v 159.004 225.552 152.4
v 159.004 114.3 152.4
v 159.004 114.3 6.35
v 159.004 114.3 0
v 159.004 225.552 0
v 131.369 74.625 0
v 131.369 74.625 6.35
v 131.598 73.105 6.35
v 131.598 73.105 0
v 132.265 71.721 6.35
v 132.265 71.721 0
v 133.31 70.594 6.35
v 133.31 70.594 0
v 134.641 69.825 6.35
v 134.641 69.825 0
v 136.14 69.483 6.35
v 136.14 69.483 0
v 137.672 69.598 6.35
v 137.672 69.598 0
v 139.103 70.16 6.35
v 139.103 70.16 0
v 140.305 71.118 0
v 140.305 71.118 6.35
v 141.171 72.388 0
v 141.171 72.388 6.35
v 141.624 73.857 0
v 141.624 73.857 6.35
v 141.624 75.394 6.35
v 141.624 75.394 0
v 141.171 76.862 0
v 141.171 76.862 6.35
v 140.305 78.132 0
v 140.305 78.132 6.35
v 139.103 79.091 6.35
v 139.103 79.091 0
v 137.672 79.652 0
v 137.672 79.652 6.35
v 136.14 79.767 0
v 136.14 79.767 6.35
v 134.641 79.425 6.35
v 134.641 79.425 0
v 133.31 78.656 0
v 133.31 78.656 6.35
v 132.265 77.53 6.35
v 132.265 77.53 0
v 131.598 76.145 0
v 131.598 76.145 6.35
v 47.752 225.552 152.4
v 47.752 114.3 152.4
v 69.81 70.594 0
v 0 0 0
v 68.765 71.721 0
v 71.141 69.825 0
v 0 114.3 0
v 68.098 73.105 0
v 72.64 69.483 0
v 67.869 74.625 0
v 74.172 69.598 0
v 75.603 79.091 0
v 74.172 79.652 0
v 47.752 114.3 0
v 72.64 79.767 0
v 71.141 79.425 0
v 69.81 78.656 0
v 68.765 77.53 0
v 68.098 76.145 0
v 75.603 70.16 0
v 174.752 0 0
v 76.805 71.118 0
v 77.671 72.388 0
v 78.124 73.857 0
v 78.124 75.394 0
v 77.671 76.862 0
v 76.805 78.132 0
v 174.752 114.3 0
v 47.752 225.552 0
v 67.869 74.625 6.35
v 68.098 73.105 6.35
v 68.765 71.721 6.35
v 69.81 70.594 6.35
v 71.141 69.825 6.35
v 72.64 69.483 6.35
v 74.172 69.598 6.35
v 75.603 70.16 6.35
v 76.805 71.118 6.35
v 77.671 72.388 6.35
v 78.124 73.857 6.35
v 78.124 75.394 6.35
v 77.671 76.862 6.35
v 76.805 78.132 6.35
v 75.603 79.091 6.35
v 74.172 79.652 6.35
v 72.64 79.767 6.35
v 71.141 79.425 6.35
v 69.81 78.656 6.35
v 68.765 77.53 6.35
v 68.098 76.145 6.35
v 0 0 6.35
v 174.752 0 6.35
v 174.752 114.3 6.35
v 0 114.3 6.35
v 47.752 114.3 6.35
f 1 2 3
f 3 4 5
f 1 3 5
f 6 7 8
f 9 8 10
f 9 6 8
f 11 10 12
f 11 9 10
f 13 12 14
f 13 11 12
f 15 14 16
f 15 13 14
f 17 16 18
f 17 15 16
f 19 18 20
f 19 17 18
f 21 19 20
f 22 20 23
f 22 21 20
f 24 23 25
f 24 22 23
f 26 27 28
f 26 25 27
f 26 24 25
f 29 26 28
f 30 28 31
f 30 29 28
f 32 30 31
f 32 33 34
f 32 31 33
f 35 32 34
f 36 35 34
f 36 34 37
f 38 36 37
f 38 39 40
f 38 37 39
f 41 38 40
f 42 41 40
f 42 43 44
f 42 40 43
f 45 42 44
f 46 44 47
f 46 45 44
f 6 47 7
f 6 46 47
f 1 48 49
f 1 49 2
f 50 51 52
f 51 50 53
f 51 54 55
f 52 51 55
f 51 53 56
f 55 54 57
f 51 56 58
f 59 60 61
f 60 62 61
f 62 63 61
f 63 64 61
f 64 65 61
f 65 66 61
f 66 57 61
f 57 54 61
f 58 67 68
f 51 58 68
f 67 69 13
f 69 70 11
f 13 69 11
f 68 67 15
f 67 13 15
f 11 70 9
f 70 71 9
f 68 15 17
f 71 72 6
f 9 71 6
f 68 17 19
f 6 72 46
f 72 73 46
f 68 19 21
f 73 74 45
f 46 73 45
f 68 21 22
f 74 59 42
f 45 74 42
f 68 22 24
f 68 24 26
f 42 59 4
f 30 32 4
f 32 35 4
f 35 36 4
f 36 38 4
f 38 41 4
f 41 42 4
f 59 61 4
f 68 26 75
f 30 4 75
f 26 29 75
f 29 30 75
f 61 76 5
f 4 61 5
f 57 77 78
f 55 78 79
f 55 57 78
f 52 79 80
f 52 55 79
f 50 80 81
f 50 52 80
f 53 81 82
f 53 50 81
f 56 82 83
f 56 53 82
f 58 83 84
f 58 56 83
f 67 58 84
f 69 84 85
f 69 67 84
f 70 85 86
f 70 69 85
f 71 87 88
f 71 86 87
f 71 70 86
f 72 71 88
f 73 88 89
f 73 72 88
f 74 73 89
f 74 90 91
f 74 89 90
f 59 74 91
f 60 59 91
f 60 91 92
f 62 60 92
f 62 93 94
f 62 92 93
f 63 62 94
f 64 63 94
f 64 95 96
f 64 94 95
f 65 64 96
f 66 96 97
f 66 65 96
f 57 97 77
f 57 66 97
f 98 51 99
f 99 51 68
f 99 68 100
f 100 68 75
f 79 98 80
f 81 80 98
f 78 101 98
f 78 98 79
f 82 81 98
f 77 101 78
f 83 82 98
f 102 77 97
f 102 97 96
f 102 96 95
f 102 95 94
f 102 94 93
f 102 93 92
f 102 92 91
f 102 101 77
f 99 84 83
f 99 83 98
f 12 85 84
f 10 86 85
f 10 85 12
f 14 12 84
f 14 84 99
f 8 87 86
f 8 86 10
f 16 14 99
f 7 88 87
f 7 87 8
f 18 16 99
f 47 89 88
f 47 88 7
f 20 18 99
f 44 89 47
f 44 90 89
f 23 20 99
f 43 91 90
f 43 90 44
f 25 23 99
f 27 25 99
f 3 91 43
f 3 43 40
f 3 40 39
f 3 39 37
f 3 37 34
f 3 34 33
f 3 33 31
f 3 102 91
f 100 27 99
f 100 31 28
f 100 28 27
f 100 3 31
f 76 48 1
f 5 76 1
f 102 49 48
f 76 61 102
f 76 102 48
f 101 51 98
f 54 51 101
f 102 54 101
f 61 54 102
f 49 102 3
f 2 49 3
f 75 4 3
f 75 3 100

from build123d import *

# Parameters (mm, degrees)
SKETCH1_W           = 174.752
SKETCH1_H           = 114.3
BOSS_EXTRUDE1_DEPTH = 6.35
SKETCH2_W           = 111.252
SKETCH2_H           = 111.252
BOSS_EXTRUDE2_DEPTH = 152.4
SKETCH3_R           = 5.1562
CUT_EXTRUDE1_DEPTH  = 324.47755132


with BuildPart() as part:
    # Sketch1 → Boss-Extrude1 (new body)
    with BuildSketch(Plane.XY):
        with Locations((87.376, 57.15)):
            Rectangle(SKETCH1_W, SKETCH1_H)
    extrude(amount=BOSS_EXTRUDE1_DEPTH)

    # Sketch2 → Boss-Extrude2 (add)
    with BuildSketch(Plane.XY):
        with Locations((103.378, 169.926)):
            Rectangle(SKETCH2_W, SKETCH2_H)
    extrude(amount=BOSS_EXTRUDE2_DEPTH)

    # Sketch3 → Cut-Extrude1 (cut, through all)
    with BuildSketch(Plane.XY):
        with Locations(Location((73.025, 74.6252, 0), (0, 0, 180))):
            Circle(SKETCH3_R)
        with Locations(Location((136.525, 74.6252, 0), (0, 0, 180))):
            Circle(SKETCH3_R)
    extrude(amount=CUT_EXTRUDE1_DEPTH, mode=Mode.SUBTRACT)


solid = part.part
